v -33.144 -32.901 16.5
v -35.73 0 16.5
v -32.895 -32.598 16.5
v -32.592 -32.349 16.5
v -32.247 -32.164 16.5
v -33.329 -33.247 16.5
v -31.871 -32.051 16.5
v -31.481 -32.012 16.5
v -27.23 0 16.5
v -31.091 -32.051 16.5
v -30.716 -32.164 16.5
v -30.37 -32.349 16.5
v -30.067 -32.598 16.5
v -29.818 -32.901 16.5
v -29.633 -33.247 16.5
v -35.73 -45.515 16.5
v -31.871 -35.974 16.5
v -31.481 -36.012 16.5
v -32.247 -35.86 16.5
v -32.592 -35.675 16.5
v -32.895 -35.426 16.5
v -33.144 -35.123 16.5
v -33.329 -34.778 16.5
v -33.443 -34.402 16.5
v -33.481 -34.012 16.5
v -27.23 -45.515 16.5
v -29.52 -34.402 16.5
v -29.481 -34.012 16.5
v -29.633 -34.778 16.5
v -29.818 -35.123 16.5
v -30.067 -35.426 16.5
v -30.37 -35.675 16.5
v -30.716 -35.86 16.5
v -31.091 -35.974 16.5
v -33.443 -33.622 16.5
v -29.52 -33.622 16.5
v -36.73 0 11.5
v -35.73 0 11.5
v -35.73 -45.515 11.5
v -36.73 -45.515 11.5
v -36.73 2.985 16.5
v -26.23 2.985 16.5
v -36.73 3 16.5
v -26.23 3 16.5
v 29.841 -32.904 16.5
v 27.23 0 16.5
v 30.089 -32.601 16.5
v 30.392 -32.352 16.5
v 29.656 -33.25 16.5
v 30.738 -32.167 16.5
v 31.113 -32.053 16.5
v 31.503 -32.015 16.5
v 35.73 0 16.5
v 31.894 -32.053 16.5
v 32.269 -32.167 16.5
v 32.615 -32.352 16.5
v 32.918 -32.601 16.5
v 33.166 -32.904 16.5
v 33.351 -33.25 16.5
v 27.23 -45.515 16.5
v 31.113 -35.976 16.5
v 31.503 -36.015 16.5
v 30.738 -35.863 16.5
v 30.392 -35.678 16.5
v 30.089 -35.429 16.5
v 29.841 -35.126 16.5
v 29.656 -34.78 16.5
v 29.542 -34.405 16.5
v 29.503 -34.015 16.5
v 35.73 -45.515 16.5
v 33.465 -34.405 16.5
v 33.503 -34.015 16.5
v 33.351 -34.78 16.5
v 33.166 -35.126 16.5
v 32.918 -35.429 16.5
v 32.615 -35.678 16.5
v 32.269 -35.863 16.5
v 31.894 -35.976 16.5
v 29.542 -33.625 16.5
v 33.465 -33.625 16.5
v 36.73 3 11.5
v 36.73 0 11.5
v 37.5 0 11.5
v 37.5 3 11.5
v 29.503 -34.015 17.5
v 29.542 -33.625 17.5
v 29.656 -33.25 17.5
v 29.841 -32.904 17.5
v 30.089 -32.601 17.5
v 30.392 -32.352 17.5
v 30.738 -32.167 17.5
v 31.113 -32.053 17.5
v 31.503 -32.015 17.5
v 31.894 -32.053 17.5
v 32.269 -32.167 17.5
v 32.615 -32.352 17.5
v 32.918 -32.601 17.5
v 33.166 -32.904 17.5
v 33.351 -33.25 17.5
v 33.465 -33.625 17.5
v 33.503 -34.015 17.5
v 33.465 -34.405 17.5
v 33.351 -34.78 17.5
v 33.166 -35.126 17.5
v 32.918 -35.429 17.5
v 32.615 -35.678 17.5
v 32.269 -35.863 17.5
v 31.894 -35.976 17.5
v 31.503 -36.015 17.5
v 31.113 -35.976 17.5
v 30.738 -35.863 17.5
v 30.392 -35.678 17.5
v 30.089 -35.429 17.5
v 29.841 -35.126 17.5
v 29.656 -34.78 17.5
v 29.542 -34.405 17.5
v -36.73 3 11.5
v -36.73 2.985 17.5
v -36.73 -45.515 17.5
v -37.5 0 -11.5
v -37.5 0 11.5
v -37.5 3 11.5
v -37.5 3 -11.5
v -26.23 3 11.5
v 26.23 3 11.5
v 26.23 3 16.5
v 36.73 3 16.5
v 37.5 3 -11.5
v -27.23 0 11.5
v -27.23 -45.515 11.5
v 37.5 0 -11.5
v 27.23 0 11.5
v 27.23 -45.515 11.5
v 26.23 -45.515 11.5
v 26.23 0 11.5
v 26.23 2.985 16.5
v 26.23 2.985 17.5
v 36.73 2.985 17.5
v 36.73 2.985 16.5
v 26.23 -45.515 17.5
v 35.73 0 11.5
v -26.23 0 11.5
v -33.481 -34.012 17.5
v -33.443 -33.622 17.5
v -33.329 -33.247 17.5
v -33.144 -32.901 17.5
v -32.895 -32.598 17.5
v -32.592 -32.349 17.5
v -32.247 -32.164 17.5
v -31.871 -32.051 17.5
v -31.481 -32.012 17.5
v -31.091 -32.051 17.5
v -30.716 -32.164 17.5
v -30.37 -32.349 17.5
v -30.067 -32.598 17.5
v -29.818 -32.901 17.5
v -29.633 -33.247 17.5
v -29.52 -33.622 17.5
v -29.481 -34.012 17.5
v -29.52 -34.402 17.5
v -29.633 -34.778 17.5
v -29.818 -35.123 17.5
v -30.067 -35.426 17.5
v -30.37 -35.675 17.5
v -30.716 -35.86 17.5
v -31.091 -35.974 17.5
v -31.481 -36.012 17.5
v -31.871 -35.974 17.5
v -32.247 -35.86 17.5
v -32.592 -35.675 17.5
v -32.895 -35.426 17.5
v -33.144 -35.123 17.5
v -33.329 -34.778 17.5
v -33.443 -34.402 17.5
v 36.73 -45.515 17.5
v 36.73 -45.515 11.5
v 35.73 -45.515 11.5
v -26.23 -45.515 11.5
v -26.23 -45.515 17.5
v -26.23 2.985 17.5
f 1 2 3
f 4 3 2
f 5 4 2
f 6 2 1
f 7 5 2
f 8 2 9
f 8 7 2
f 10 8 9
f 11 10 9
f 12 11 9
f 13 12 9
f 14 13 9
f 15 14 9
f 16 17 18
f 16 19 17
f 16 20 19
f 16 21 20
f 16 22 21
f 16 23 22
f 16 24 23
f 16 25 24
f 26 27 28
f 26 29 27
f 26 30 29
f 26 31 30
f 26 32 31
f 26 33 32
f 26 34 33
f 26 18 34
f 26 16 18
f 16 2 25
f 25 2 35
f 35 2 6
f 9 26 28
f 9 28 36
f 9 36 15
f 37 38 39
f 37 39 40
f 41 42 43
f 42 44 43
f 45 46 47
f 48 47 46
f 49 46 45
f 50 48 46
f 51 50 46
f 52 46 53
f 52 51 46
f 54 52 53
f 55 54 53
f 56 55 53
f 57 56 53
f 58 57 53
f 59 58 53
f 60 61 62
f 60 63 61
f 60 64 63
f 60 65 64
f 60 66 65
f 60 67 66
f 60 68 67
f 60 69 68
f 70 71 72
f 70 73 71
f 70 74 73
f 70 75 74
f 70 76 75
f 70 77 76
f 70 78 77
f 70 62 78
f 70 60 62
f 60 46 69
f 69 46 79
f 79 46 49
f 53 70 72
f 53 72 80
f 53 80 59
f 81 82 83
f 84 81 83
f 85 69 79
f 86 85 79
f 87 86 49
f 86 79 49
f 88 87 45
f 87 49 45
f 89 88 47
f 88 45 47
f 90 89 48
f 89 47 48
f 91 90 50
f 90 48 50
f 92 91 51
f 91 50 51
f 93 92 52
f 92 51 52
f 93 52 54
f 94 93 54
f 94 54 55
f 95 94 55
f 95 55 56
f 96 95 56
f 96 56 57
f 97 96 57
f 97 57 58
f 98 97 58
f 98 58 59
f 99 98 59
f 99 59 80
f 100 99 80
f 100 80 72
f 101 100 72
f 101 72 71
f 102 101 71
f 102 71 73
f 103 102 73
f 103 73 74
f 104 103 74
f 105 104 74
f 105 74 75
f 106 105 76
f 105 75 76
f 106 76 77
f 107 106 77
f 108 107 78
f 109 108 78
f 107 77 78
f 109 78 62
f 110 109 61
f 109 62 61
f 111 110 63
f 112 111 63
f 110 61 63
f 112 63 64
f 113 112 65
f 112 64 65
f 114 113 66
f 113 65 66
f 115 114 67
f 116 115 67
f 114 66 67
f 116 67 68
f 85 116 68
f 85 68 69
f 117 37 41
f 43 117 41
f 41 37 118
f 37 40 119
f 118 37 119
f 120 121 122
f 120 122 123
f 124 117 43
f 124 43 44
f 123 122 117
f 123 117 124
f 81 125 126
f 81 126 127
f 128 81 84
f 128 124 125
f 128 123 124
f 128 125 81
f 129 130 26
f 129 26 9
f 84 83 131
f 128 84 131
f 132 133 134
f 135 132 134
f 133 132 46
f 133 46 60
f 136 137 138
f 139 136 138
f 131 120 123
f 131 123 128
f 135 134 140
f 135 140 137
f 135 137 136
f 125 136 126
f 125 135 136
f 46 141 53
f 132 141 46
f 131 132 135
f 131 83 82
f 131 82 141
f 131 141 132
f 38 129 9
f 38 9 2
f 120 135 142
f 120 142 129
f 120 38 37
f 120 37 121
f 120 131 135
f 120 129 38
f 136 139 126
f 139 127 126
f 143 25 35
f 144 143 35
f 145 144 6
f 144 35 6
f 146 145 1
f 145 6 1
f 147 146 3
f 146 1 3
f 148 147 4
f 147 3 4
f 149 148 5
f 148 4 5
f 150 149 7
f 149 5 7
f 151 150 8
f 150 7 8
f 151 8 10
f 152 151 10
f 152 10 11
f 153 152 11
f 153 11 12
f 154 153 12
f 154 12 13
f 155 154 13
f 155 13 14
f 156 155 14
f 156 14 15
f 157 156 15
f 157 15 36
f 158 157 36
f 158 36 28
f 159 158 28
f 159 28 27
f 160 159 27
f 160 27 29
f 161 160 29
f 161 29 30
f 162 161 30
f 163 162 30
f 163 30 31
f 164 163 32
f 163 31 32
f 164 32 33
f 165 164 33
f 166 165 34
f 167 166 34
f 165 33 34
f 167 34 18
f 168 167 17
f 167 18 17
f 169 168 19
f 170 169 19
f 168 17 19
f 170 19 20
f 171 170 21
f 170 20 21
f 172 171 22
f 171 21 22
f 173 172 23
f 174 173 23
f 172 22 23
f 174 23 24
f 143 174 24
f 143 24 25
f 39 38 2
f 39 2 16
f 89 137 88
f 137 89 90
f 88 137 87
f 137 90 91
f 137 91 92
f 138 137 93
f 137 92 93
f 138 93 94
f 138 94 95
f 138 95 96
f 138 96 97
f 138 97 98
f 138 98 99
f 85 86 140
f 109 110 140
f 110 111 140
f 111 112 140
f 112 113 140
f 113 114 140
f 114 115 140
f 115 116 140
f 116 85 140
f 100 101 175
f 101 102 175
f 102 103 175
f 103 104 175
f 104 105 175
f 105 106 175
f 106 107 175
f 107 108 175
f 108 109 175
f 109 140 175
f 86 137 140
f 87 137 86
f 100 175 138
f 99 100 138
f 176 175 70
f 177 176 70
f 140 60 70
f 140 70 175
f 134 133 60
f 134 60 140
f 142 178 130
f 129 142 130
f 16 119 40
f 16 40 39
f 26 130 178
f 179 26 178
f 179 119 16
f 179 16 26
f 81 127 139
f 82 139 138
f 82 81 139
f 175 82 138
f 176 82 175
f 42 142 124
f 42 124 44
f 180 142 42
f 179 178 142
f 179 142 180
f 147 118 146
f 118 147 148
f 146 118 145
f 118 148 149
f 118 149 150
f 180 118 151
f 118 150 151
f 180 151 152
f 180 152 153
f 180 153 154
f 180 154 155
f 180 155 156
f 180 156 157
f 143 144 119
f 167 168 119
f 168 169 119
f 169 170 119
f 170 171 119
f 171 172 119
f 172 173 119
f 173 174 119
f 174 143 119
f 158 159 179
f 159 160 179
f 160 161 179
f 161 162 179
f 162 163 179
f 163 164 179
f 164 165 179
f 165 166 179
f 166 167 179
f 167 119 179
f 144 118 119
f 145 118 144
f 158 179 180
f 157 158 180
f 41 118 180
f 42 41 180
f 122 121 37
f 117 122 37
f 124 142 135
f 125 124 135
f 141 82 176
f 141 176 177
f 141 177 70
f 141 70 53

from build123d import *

# Parameters (mm, degrees)
SKETCH1_W           = 75
SKETCH1_H           = 23
BOSS_EXTRUDE1_DEPTH = 3
BOSS_EXTRUDE4_DEPTH = 5
SKETCH3_W           = 10.5
SKETCH3_H           = 1
BOSS_EXTRUDE5_DEPTH = 48.5
SKETCH4_R           = 2
CUT_EXTRUDE1_DEPTH  = 66.282886378


with BuildPart() as part:
    # Sketch1 → Boss-Extrude1 (new body)
    with BuildSketch(Plane(origin=(0, 0, 0), x_dir=(1, 0, 0), z_dir=(0, 1, 0))):
        Rectangle(SKETCH1_W, SKETCH1_H)
    extrude(amount=BOSS_EXTRUDE1_DEPTH)

    # Sketch2 → Boss-Extrude4 (add)
    with BuildSketch(Plane.XY.offset(11.5)):
        Polygon((27.230257431, 0), (27.230257431, -45.514890462), (26.230257431, -45.514890462), (26.230257431, 3), (36.730257431, 3), (36.730257431, -45.514890462), (35.730257431, -45.514890462), (35.730257431, 0), align=None)
        Polygon((-35.730257431, -45.514890462), (-36.730257431, -45.514890462), (-36.730257431, 3), (-26.230257431, 3), (-26.230257431, -45.514890462), (-27.230257431, -45.514890462), (-27.230257431, 0), (-35.730257431, 0), align=None)
    extrude(amount=BOSS_EXTRUDE4_DEPTH)

    # Sketch3 → Boss-Extrude5 (add)
    with BuildSketch(Plane.XZ.offset(45.514890462)):
        with Locations((-31.480257431, 17)):
            Rectangle(SKETCH3_W, SKETCH3_H)
        with Locations((31.480257431, 17)):
            Rectangle(SKETCH3_W, SKETCH3_H)
    extrude(amount=-BOSS_EXTRUDE5_DEPTH)

    # Sketch4 → Cut-Extrude1 (cut, through all)
    with BuildSketch(Plane(origin=(0, 0, 16.5), x_dir=(-1, 0, 0), z_dir=(0, 0, -1))):
        with Locations((31.481258109, -34.012149814)):
            Circle(SKETCH4_R)
        with Locations((-31.503449984, -34.014890462)):
            Circle(SKETCH4_R)
    extrude(amount=-CUT_EXTRUDE1_DEPTH, mode=Mode.SUBTRACT)


solid = part.part
